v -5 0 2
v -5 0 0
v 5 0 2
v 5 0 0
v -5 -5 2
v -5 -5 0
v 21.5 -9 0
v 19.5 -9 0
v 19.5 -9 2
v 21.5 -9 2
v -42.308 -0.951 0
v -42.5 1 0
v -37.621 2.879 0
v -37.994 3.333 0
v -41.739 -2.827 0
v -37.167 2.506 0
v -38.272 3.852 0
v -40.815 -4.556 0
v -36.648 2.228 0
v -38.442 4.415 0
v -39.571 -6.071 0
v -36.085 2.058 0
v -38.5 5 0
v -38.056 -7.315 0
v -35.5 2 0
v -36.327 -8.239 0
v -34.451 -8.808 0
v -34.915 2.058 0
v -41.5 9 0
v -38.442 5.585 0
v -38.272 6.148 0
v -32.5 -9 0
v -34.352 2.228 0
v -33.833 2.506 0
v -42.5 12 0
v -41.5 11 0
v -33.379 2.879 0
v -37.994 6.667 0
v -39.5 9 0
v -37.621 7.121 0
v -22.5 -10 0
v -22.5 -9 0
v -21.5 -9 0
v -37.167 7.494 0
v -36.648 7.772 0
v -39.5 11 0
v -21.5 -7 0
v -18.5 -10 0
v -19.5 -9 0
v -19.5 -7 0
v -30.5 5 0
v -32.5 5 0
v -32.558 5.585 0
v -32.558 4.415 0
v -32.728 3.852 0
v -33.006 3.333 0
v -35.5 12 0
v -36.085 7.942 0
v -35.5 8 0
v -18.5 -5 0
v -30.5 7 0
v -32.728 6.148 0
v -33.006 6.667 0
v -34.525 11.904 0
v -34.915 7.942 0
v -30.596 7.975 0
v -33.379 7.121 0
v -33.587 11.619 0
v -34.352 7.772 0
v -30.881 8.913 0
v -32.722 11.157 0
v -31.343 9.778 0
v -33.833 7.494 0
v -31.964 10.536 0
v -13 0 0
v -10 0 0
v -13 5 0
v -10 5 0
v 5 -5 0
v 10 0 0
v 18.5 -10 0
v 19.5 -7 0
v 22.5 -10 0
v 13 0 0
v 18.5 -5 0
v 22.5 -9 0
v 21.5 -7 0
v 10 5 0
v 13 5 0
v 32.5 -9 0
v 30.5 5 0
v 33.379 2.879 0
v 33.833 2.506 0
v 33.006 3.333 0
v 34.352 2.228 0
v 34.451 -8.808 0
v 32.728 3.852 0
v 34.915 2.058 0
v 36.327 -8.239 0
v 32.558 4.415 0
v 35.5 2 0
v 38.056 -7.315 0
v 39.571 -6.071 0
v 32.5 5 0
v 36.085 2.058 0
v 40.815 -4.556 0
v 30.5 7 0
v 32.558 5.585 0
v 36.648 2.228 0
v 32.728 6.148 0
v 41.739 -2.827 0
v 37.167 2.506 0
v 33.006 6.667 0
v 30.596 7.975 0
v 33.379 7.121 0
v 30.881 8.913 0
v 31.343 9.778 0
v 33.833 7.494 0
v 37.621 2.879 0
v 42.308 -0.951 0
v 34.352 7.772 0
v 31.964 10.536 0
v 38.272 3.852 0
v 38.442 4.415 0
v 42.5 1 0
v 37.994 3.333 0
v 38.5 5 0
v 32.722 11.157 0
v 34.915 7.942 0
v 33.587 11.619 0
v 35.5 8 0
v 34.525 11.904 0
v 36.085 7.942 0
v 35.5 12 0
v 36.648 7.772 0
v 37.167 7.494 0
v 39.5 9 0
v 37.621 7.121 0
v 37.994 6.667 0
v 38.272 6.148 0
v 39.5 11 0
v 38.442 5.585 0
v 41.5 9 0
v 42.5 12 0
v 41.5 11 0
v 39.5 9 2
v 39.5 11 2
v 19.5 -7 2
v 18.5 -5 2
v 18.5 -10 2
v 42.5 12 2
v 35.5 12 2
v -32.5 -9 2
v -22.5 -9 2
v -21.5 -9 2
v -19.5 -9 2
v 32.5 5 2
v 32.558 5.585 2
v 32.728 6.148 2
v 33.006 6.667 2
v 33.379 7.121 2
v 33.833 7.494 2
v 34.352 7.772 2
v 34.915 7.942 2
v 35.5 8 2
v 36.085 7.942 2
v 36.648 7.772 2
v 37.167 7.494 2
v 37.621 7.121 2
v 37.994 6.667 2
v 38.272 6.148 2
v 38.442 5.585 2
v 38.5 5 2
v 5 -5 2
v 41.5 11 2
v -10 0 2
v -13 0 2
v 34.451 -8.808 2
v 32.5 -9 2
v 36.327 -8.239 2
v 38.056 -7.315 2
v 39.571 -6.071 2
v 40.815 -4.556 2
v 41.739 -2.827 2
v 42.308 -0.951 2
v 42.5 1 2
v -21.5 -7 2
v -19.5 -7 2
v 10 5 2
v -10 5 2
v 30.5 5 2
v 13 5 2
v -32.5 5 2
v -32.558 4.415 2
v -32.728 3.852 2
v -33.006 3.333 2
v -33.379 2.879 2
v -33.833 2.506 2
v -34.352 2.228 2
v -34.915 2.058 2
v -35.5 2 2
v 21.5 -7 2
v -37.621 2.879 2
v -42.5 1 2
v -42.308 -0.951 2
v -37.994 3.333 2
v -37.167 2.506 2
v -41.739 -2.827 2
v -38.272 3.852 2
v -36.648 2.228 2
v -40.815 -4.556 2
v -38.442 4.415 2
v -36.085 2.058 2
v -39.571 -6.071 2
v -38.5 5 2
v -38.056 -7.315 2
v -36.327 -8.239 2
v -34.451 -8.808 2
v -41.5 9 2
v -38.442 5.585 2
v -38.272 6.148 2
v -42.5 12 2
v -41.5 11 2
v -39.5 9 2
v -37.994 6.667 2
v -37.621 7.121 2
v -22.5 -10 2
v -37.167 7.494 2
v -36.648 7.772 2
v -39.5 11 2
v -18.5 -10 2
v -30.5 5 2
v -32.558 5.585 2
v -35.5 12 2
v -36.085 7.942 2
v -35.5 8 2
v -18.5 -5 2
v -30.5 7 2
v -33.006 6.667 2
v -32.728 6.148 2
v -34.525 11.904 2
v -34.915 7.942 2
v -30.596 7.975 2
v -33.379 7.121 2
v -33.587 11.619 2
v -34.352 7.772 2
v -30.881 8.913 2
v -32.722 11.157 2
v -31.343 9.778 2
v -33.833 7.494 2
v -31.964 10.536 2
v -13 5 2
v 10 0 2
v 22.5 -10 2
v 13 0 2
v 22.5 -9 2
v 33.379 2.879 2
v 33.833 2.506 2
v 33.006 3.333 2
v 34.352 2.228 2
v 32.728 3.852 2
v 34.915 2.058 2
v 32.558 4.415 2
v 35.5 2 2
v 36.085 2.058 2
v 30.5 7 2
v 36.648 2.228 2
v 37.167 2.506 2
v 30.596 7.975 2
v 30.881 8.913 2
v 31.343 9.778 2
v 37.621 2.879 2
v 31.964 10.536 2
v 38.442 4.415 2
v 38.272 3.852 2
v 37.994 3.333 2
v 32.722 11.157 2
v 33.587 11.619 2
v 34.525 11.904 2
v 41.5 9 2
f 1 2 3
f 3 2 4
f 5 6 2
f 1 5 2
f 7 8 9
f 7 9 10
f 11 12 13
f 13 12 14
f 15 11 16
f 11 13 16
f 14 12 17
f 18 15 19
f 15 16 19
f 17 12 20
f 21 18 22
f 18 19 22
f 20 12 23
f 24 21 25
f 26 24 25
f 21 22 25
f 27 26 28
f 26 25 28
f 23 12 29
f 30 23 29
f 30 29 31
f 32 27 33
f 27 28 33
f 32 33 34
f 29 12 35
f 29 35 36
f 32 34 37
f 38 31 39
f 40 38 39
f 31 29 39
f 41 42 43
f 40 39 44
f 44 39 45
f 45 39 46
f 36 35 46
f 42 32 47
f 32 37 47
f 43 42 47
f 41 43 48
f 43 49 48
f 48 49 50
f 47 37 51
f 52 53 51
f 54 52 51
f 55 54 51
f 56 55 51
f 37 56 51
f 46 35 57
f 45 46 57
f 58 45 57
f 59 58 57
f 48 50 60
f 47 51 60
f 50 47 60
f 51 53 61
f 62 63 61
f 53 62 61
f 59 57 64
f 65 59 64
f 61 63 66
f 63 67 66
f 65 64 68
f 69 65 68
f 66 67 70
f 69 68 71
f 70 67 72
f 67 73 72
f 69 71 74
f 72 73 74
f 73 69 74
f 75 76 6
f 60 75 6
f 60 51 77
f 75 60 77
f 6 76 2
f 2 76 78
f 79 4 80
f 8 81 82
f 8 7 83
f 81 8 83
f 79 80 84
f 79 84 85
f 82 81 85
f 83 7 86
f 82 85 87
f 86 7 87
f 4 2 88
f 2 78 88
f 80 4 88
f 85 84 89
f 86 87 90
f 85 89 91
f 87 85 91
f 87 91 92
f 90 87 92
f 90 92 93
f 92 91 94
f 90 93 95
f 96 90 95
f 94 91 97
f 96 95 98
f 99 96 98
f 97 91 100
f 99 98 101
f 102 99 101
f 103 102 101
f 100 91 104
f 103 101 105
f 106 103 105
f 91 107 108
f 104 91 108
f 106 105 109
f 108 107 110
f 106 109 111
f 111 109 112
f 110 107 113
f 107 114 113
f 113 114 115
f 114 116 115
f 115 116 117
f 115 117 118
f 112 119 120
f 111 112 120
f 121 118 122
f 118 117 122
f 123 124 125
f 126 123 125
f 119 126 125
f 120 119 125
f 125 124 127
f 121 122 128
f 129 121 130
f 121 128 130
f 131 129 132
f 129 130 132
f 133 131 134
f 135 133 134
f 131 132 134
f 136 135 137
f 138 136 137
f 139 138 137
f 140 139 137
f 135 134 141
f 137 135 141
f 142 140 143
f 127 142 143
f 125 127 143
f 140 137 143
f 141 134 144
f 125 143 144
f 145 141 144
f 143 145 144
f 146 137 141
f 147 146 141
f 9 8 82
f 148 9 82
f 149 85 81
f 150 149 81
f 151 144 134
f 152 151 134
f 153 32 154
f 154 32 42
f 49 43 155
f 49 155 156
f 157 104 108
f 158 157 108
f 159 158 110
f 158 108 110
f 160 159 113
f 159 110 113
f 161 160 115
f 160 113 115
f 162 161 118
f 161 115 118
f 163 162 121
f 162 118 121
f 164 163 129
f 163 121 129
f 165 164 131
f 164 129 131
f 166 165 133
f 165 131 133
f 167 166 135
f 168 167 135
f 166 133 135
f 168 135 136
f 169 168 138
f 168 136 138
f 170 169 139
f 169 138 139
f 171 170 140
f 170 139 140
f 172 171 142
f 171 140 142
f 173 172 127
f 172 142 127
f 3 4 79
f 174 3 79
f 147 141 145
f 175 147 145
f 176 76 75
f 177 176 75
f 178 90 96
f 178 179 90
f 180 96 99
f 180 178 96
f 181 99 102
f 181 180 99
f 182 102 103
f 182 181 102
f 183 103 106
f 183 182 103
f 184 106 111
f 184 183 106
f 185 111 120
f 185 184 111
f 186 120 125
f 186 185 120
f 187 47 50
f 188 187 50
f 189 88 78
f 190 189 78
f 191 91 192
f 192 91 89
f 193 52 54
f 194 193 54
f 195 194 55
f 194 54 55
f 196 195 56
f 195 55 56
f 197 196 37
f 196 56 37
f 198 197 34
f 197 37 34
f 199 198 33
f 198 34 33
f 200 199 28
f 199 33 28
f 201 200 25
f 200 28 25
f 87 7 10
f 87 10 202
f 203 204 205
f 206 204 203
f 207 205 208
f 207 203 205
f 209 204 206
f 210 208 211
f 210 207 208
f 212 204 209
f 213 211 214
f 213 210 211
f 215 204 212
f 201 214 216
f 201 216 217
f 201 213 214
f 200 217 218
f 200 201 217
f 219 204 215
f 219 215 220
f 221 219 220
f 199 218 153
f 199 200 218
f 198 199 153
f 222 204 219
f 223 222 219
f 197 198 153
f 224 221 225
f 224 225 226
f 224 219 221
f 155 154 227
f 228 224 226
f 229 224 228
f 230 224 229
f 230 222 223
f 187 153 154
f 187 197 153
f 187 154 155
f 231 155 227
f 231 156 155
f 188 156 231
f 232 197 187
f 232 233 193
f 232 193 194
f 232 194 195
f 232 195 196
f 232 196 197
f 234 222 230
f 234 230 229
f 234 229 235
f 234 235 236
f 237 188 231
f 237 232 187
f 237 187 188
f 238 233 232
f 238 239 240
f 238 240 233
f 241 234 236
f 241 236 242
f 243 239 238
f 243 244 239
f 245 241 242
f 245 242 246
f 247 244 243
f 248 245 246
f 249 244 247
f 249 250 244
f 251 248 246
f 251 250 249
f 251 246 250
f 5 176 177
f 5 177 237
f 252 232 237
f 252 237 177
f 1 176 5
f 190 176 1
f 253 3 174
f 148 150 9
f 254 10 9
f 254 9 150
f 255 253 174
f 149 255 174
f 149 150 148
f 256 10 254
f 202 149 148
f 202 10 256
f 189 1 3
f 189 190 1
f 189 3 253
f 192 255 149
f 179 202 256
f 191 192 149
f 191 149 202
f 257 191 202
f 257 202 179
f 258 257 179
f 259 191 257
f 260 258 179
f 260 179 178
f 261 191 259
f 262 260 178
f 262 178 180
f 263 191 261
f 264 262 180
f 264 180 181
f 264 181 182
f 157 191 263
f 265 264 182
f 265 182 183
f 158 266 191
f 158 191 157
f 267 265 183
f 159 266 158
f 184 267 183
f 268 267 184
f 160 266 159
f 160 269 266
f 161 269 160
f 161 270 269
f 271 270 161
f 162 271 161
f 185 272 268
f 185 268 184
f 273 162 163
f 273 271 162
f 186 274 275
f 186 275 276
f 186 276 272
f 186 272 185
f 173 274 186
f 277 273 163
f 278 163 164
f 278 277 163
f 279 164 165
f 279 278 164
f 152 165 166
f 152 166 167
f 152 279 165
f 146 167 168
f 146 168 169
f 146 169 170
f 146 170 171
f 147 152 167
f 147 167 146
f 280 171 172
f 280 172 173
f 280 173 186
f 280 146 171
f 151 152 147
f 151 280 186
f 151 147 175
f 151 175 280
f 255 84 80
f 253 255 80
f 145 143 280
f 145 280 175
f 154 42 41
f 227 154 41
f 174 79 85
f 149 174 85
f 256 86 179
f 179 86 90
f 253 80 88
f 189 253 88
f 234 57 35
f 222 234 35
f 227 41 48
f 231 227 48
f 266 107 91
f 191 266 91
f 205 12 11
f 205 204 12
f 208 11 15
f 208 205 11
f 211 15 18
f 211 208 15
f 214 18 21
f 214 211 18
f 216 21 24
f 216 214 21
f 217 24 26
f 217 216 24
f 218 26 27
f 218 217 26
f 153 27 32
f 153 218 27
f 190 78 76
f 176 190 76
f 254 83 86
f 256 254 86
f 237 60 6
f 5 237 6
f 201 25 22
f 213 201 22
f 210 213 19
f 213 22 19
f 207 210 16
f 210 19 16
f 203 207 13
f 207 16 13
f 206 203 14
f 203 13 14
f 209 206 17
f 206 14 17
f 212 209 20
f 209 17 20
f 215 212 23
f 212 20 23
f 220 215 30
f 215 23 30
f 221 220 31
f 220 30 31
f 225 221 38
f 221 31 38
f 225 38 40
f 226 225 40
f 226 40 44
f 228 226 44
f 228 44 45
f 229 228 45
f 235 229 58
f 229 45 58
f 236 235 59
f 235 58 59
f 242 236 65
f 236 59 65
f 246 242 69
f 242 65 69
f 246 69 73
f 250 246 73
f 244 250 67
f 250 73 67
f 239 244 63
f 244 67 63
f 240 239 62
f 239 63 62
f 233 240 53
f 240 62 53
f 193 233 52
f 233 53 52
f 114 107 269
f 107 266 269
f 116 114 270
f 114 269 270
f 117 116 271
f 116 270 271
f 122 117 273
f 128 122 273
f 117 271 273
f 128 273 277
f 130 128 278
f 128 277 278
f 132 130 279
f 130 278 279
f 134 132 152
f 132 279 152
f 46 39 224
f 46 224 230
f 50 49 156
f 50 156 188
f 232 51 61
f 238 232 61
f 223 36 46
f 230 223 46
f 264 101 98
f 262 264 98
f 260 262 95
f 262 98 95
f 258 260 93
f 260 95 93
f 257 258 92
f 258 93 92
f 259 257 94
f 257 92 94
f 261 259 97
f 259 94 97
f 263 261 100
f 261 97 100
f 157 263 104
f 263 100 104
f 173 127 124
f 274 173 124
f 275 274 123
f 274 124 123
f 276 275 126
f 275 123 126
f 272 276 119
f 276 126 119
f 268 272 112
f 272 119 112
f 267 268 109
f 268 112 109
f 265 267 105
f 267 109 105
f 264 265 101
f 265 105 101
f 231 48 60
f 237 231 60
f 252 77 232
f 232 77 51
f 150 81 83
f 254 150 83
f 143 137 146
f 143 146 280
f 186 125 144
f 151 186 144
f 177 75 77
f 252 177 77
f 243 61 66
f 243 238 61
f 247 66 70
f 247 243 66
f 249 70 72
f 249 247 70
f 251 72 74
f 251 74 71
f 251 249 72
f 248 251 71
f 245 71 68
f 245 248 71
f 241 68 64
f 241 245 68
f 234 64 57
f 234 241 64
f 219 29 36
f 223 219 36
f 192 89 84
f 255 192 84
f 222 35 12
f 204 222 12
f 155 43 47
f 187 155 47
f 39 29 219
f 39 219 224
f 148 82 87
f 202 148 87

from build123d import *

# Parameters (mm, degrees)
SKETCH1_W           = 2
SKETCH1_H           = 2
SKETCH1_W_2         = 7
SKETCH1_H_2         = 5
BOSS_EXTRUDE2_DEPTH = 2
FILLET1_R           = 10
FILLET2_R           = 10
FILLET3_R           = 5
FILLET4_R           = 5


with BuildPart() as part:
    # Sketch1 → Boss-Extrude2 (new body)
    with BuildSketch(Plane.XY):
        with BuildLine():
            Line((-42.5, 0), (-35.5, 0))
            Line((-35.5, 0), (-35.5, 2))
            ThreePointArc((-35.5, 2), (-37.621320344, 7.121320344), (-32.5, 5))
            Line((-32.5, 5), (-30.5, 5))
            Line((-30.5, 5), (-30.5, 12))
            Line((-30.5, 12), (-42.5, 12))
            Line((-42.5, 12), (-42.5, 0))
        make_face()
        with Locations((-40.5, 10)):
            Rectangle(SKETCH1_W, SKETCH1_H, mode=Mode.SUBTRACT)
        Polygon((-18.5, -5), (-35.5, -5), (-42.5, -5), (-42.5, -9), (-22.5, -9), (-22.5, -10), (-18.5, -10), (-18.5, -9), align=None)
        with Locations((-20.5, -8)):
            Rectangle(SKETCH1_W, SKETCH1_H, mode=Mode.SUBTRACT)
        with Locations((-39, -2.5)):
            Rectangle(SKETCH1_W_2, SKETCH1_H_2)
        with BuildLine():
            Line((-35.5, 0), (-35.5, -5))
            Line((-35.5, -5), (-18.5, -5))
            Line((-18.5, -5), (-5, -5))
            Line((-5, -5), (-5, 0))
            Line((-5, 0), (-10, 0))
            Line((-10, 0), (-13, 0))
            Line((-13, 0), (-13, 5))
            Line((-13, 5), (-30.5, 5))
            Line((-30.5, 5), (-32.5, 5))
            ThreePointArc((-32.5, 5), (-33.378679656, 2.878679656), (-35.5, 2))
            Line((-35.5, 2), (-35.5, 0))
        make_face()
        Polygon((-10, 0), (-5, 0), (5, 0), (10, 0), (10, 5), (-10, 5), align=None)
        Polygon((35.5, -5), (18.5, -5), (18.5, -9), (18.5, -10), (22.5, -10), (22.5, -9), (42.5, -9), (42.5, -5), align=None)
        with Locations((20.5, -8)):
            Rectangle(SKETCH1_W, SKETCH1_H, mode=Mode.SUBTRACT)
        with Locations((39, -2.5)):
            Rectangle(SKETCH1_W_2, SKETCH1_H_2)
        with BuildLine():
            Line((35.5, 2), (35.5, 0))
            Line((35.5, 0), (42.5, 0))
            Line((42.5, 0), (42.5, 12))
            Line((42.5, 12), (30.5, 12))
            Line((30.5, 12), (30.5, 5))
            Line((30.5, 5), (32.5, 5))
            ThreePointArc((32.5, 5), (35.5, 8), (38.5, 5))
            ThreePointArc((38.5, 5), (37.621320344, 2.878679656), (35.5, 2))
        make_face()
        with Locations((40.5, 10)):
            Rectangle(SKETCH1_W, SKETCH1_H, mode=Mode.SUBTRACT)
        with BuildLine():
            Line((5, 0), (5, -5))
            Line((5, -5), (18.5, -5))
            Line((18.5, -5), (35.5, -5))
            Line((35.5, -5), (35.5, 0))
            Line((35.5, 0), (35.5, 2))
            ThreePointArc((35.5, 2), (33.378679656, 2.878679656), (32.5, 5))
            Line((32.5, 5), (30.5, 5))
            Line((30.5, 5), (13, 5))
            Line((13, 5), (13, 0))
            Line((13, 0), (10, 0))
            Line((10, 0), (5, 0))
        make_face()
    extrude(amount=BOSS_EXTRUDE2_DEPTH)

    # Fillet1
    fillet1_edges = [part.edges().sort_by_distance(p)[0] for p in [
        (-42.5, -9, 1),
    ]]
    fillet(fillet1_edges, radius=FILLET1_R)

    # Fillet2
    fillet2_edges = [part.edges().sort_by_distance(p)[0] for p in [
        (42.5, -9, 1),
    ]]
    fillet(fillet2_edges, radius=FILLET2_R)

    # Fillet3
    fillet3_edges = [part.edges().sort_by_distance(p)[0] for p in [
        (-30.5, 12, 1),
    ]]
    fillet(fillet3_edges, radius=FILLET3_R)

    # Fillet4
    fillet4_edges = [part.edges().sort_by_distance(p)[0] for p in [
        (30.5, 12, 1),
    ]]
    fillet(fillet4_edges, radius=FILLET4_R)


solid = part.part
